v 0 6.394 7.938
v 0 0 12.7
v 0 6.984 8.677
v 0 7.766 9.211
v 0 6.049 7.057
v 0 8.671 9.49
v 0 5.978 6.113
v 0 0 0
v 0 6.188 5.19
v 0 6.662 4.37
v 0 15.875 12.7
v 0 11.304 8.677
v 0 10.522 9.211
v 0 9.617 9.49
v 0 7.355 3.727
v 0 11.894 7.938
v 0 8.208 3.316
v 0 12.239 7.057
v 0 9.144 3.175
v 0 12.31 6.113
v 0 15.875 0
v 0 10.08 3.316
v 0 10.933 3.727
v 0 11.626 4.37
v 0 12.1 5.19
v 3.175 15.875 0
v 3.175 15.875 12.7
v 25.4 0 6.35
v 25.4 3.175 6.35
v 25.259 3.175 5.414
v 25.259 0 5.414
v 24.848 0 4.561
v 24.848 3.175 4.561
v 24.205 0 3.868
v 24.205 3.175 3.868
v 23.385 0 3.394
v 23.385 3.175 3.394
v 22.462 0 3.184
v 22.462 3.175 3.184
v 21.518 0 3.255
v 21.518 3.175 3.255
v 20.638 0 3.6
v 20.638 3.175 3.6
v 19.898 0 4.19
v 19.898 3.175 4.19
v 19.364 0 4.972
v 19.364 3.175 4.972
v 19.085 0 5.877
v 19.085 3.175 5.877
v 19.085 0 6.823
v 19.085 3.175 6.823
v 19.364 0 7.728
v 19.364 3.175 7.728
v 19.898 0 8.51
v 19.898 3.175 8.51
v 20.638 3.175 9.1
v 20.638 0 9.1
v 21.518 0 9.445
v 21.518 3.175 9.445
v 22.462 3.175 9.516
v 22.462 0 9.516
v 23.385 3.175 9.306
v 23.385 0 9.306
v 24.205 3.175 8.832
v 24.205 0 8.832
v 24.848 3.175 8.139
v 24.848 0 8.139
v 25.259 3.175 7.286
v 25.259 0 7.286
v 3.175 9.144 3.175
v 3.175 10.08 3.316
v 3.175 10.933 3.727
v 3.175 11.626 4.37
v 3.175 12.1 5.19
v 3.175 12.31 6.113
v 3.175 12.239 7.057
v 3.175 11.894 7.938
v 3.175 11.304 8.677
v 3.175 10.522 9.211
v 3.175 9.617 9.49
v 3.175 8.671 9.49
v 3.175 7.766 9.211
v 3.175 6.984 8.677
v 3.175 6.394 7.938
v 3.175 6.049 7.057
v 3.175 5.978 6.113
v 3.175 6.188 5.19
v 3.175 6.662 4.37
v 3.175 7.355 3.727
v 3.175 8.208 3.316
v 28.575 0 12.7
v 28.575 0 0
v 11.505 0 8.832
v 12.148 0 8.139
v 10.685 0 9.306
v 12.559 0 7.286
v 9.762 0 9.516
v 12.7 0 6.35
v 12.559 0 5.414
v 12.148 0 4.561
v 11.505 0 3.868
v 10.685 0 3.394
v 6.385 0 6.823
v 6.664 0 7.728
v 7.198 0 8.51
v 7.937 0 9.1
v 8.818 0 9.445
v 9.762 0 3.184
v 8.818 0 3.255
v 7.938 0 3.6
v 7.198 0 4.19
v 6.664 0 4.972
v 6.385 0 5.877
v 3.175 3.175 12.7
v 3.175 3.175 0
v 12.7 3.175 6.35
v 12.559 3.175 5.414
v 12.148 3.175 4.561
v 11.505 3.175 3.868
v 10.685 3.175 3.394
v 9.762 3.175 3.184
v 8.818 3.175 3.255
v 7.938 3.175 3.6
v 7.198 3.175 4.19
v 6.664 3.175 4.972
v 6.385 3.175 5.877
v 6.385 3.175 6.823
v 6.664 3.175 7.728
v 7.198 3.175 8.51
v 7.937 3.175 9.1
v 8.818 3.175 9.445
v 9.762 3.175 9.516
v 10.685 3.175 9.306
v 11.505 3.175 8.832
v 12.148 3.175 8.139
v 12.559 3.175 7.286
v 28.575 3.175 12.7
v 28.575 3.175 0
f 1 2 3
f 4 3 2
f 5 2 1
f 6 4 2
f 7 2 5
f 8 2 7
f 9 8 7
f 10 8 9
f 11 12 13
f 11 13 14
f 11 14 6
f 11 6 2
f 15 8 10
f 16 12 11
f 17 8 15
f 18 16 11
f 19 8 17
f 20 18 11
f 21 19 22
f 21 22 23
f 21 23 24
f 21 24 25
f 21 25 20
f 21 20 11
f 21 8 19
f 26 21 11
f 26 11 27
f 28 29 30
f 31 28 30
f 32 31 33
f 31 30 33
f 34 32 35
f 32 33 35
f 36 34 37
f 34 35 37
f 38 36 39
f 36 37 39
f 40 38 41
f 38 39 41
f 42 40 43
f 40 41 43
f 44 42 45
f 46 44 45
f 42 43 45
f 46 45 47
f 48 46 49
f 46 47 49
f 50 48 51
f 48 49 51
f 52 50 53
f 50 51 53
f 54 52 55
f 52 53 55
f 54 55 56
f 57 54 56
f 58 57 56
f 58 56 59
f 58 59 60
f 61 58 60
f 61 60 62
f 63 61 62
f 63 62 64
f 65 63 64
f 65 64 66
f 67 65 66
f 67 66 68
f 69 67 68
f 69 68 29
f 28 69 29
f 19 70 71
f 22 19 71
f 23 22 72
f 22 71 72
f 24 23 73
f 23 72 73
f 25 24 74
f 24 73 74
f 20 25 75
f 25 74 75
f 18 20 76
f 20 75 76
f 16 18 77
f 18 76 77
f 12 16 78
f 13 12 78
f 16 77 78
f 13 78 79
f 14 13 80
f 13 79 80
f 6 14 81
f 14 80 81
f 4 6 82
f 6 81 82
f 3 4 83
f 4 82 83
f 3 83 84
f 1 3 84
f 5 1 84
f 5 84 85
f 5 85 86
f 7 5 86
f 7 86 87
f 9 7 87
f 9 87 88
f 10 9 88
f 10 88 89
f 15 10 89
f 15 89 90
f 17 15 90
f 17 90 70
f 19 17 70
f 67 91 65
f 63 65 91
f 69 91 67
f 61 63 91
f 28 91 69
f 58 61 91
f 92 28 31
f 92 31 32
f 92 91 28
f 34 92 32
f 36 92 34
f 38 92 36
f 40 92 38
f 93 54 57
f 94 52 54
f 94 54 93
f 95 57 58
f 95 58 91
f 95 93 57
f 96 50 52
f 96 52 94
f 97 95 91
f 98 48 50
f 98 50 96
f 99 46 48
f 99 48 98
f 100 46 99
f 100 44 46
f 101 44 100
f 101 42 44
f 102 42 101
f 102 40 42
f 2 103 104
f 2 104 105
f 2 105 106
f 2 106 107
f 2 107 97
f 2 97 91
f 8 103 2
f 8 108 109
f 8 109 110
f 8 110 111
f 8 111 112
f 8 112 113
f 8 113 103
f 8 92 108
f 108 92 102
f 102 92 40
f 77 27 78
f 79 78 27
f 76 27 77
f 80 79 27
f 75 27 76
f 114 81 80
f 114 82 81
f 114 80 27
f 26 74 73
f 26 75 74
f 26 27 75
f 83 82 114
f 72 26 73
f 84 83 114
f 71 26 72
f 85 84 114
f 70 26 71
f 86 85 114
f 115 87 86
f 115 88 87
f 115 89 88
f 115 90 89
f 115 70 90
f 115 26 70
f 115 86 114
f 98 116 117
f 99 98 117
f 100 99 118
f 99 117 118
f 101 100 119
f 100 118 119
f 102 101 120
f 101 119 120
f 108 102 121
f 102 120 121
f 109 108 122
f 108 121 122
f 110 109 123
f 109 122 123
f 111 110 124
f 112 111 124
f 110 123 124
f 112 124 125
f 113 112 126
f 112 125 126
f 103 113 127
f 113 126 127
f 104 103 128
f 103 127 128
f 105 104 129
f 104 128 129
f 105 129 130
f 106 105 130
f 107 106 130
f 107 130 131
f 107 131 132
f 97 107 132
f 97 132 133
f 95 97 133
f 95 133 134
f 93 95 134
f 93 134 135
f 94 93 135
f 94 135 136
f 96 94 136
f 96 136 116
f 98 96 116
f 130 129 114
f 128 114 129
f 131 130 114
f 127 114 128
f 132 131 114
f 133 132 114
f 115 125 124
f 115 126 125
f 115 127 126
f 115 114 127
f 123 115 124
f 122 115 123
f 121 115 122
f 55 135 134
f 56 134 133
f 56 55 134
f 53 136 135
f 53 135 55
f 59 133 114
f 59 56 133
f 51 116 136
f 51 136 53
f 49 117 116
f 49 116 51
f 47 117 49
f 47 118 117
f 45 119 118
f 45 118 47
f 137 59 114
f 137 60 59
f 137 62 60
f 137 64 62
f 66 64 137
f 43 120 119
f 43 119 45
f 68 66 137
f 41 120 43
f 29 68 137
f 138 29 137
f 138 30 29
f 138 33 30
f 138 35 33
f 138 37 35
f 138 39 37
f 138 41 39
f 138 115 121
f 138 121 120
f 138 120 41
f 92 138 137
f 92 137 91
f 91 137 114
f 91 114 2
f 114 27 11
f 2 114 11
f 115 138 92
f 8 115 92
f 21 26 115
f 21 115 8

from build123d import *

# Parameters (mm, degrees)
BOSS_EXTRUDE1_DEPTH = 12.7
SKETCH2_R           = 3.175
CUT_EXTRUDE1_DEPTH  = 4.175
SKETCH3_R           = 3.175
CUT_EXTRUDE2_DEPTH  = 4.175


with BuildPart() as part:
    # Sketch1 → Boss-Extrude1 (new body)
    with BuildSketch(Plane.XY):
        Polygon((0, 0), (0, 15.875), (3.175, 15.875), (3.175, 3.175), (28.575, 3.175), (28.575, 0), align=None)
    extrude(amount=BOSS_EXTRUDE1_DEPTH)

    # Sketch2 → Cut-Extrude1 (cut, through all)
    with BuildSketch(Plane(origin=(0, 3.175, 0), x_dir=(1, 0, 0), z_dir=(0, 1, 0))):
        with Locations((9.525, -6.35)):
            Circle(SKETCH2_R)
        with Locations((22.225, -6.35)):
            Circle(SKETCH2_R)
    extrude(amount=-CUT_EXTRUDE1_DEPTH, mode=Mode.SUBTRACT)

    # Sketch3 → Cut-Extrude2 (cut, through all)
    with BuildSketch(Plane(origin=(3.175, 0, 0), x_dir=(0, 0, -1), z_dir=(1, 0, 0))):
        with Locations((-6.35, 9.144)):
            Circle(SKETCH3_R)
    extrude(amount=-CUT_EXTRUDE2_DEPTH, mode=Mode.SUBTRACT)


solid = part.part
